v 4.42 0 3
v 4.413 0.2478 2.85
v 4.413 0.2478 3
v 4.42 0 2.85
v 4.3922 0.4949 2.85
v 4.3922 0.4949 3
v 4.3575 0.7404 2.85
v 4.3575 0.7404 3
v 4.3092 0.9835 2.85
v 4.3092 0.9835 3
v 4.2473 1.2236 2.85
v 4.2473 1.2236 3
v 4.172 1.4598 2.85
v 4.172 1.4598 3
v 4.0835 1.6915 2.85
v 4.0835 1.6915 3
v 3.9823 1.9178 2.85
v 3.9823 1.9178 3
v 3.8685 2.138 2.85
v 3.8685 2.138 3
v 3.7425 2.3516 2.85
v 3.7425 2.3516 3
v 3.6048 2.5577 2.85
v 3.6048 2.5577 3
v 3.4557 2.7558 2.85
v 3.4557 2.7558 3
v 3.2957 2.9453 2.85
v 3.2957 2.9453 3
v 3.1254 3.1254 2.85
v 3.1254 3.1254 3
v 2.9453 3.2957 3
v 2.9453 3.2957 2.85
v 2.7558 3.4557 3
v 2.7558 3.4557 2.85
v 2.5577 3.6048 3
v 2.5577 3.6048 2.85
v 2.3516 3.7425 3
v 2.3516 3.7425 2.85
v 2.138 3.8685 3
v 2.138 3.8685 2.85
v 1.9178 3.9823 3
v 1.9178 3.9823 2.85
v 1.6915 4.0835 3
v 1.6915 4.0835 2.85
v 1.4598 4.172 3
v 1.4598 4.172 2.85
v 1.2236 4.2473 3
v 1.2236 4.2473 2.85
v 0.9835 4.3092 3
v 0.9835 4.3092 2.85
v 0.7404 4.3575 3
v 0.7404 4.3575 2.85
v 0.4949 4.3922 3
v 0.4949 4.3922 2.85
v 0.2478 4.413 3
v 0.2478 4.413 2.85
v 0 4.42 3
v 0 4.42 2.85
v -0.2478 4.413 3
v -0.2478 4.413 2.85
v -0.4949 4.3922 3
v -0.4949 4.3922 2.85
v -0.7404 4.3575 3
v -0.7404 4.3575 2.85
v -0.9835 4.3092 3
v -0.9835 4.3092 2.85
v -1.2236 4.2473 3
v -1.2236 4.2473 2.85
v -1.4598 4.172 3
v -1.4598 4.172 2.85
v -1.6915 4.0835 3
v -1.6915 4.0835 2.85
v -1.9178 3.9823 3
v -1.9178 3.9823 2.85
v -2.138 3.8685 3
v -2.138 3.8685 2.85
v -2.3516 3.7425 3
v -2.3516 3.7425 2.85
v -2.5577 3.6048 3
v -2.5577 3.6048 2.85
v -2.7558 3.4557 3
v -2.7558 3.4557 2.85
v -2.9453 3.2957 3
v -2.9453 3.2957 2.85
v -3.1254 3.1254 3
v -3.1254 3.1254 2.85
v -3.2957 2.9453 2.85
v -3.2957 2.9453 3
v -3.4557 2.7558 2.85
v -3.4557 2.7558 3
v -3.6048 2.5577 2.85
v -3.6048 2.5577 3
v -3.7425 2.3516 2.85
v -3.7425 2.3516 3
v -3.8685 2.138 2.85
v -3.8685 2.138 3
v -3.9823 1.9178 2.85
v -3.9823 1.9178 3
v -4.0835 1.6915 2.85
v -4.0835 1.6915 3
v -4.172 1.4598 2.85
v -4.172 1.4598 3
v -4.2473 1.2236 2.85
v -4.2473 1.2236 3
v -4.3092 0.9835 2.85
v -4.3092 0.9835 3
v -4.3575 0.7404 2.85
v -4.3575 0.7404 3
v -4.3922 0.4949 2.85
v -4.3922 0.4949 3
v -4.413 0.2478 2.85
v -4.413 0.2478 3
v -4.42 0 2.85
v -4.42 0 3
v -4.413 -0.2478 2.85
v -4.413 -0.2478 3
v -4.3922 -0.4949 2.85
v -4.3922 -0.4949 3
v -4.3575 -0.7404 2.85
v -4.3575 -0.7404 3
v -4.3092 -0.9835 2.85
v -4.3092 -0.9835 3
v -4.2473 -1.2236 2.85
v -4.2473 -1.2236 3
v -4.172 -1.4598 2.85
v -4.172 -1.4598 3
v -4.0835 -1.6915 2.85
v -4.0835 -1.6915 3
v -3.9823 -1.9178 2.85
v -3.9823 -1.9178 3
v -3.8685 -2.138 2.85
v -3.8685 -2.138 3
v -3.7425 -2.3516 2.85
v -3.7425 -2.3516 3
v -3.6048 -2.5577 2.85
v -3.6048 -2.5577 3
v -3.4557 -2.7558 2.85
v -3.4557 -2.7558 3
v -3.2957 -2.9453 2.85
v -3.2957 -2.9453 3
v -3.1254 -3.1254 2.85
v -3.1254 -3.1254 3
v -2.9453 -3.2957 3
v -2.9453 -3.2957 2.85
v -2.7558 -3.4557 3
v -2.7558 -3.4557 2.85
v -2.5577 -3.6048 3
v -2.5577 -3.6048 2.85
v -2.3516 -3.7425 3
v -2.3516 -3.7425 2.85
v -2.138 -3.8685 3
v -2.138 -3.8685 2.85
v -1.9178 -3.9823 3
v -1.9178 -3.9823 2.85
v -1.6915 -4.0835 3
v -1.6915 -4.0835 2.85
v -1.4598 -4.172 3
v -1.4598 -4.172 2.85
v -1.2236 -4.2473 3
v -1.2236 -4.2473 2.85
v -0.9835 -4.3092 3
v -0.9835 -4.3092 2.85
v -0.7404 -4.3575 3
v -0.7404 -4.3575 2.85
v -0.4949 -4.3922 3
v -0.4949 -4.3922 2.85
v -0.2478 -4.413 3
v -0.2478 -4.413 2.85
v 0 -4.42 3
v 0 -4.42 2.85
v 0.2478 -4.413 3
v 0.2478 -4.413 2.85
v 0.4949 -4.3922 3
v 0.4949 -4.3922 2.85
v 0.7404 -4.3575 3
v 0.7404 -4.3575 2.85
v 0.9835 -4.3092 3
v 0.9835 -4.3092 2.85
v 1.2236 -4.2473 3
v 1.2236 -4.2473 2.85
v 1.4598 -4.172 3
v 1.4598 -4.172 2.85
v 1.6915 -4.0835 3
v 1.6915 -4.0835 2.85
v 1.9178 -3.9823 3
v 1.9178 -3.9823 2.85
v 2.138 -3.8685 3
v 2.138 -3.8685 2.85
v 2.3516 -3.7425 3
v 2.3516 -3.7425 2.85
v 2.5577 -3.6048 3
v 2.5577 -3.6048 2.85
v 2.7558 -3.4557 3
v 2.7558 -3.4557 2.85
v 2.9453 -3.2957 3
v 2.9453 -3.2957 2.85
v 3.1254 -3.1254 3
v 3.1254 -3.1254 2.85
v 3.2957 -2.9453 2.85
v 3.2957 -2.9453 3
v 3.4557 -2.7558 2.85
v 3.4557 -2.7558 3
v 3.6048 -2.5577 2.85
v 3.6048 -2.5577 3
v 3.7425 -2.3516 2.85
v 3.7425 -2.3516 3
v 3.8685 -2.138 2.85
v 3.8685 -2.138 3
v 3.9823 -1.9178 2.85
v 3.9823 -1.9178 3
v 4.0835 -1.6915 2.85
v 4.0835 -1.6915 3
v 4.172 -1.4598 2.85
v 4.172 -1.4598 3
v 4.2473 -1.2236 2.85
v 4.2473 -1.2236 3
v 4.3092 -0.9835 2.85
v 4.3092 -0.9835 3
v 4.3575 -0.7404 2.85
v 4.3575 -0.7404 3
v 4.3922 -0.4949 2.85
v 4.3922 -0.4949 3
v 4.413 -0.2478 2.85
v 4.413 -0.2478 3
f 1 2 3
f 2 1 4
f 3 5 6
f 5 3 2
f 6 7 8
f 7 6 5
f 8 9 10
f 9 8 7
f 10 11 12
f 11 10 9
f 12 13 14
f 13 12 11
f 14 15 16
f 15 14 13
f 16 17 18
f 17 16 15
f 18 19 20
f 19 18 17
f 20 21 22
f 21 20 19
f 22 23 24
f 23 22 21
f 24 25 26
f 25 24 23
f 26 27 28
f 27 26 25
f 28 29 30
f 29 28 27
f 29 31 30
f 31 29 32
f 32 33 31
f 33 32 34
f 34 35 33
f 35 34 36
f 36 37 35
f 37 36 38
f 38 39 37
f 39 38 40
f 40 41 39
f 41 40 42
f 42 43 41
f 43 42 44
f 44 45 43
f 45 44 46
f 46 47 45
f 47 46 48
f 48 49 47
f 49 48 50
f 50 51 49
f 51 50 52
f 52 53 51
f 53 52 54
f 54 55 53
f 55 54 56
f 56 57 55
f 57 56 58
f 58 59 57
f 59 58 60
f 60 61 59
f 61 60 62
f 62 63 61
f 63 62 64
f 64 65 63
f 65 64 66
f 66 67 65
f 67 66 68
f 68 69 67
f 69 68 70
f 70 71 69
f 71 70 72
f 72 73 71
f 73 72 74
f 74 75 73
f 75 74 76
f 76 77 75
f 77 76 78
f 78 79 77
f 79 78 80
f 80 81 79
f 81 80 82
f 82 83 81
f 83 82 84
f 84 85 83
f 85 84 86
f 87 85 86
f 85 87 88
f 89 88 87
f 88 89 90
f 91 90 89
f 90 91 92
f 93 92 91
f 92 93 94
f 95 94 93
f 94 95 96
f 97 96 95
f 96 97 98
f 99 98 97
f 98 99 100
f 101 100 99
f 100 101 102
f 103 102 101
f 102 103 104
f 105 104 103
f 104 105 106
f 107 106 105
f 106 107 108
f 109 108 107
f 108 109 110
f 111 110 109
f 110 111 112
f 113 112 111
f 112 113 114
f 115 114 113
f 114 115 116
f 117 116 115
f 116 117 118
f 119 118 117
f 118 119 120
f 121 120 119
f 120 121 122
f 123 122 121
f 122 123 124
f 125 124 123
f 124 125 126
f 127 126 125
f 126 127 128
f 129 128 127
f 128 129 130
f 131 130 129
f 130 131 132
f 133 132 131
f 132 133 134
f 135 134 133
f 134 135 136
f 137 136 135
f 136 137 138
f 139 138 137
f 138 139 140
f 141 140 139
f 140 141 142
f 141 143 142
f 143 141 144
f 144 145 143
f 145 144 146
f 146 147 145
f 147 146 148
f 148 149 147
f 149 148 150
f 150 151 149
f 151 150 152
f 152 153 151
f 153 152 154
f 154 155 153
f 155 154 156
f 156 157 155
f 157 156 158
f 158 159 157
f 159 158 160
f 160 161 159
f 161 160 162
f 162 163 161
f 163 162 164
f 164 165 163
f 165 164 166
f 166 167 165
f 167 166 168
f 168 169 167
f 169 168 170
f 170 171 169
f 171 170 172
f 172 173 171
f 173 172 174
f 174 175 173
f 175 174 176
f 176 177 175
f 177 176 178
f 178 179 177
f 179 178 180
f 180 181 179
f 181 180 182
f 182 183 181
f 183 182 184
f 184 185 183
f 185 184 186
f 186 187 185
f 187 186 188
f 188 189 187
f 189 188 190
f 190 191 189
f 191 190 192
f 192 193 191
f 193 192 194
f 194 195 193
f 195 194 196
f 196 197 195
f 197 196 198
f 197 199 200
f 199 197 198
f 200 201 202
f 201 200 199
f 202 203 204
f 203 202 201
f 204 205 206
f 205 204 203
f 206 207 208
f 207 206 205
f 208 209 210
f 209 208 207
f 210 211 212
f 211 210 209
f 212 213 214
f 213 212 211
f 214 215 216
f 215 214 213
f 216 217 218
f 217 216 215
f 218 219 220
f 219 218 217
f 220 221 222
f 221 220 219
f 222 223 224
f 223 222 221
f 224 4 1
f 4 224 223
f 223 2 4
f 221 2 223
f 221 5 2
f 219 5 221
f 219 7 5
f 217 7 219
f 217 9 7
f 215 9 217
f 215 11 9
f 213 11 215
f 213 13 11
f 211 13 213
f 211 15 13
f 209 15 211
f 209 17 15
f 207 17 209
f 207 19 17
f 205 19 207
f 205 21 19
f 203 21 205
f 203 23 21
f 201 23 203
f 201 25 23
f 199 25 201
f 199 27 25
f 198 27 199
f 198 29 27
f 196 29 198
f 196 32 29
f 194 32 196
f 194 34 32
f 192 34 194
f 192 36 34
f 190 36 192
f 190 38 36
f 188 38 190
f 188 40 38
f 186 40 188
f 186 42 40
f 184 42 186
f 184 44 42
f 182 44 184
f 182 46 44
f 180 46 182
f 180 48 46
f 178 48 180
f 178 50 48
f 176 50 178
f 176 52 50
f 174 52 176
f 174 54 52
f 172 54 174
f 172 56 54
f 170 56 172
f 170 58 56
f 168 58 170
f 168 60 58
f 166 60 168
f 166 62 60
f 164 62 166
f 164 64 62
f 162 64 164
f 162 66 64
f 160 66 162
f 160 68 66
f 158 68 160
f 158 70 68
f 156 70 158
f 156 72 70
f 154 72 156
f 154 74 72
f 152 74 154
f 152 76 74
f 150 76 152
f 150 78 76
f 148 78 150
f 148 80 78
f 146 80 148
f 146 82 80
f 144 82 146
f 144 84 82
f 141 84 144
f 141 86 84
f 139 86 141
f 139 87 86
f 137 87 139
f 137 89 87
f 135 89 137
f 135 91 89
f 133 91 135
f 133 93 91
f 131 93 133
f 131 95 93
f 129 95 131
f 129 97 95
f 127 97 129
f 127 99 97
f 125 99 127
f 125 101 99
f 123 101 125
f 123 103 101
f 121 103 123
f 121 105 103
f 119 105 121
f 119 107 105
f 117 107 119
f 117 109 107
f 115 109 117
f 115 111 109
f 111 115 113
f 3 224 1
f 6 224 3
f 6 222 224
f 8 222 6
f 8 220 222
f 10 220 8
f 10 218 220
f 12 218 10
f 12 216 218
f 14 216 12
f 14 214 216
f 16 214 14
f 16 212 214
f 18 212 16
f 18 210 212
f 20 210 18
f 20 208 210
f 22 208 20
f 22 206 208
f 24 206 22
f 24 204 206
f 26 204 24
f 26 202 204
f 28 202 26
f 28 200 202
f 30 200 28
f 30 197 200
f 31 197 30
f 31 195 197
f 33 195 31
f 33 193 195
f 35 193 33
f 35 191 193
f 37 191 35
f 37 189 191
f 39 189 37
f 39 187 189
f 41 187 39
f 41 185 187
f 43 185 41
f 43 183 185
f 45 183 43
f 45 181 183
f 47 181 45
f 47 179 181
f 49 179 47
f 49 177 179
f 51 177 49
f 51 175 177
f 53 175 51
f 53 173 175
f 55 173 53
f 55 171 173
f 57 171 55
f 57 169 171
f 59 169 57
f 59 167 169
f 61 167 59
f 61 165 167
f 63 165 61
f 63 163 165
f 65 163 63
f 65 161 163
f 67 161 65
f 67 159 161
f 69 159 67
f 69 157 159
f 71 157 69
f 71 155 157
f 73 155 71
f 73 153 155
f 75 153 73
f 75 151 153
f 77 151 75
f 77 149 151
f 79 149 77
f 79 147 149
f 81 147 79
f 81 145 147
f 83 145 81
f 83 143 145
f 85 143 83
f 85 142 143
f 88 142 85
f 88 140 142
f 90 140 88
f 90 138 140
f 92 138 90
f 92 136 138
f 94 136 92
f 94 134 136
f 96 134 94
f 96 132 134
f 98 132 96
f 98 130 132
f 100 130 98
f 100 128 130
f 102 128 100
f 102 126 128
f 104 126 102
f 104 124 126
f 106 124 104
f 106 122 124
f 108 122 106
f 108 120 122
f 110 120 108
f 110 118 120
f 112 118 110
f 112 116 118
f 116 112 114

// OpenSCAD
// Dark engine-bay interior plate only, for the web CAD preview.
use <starship_parametric.scad>

bay_bulkhead();
